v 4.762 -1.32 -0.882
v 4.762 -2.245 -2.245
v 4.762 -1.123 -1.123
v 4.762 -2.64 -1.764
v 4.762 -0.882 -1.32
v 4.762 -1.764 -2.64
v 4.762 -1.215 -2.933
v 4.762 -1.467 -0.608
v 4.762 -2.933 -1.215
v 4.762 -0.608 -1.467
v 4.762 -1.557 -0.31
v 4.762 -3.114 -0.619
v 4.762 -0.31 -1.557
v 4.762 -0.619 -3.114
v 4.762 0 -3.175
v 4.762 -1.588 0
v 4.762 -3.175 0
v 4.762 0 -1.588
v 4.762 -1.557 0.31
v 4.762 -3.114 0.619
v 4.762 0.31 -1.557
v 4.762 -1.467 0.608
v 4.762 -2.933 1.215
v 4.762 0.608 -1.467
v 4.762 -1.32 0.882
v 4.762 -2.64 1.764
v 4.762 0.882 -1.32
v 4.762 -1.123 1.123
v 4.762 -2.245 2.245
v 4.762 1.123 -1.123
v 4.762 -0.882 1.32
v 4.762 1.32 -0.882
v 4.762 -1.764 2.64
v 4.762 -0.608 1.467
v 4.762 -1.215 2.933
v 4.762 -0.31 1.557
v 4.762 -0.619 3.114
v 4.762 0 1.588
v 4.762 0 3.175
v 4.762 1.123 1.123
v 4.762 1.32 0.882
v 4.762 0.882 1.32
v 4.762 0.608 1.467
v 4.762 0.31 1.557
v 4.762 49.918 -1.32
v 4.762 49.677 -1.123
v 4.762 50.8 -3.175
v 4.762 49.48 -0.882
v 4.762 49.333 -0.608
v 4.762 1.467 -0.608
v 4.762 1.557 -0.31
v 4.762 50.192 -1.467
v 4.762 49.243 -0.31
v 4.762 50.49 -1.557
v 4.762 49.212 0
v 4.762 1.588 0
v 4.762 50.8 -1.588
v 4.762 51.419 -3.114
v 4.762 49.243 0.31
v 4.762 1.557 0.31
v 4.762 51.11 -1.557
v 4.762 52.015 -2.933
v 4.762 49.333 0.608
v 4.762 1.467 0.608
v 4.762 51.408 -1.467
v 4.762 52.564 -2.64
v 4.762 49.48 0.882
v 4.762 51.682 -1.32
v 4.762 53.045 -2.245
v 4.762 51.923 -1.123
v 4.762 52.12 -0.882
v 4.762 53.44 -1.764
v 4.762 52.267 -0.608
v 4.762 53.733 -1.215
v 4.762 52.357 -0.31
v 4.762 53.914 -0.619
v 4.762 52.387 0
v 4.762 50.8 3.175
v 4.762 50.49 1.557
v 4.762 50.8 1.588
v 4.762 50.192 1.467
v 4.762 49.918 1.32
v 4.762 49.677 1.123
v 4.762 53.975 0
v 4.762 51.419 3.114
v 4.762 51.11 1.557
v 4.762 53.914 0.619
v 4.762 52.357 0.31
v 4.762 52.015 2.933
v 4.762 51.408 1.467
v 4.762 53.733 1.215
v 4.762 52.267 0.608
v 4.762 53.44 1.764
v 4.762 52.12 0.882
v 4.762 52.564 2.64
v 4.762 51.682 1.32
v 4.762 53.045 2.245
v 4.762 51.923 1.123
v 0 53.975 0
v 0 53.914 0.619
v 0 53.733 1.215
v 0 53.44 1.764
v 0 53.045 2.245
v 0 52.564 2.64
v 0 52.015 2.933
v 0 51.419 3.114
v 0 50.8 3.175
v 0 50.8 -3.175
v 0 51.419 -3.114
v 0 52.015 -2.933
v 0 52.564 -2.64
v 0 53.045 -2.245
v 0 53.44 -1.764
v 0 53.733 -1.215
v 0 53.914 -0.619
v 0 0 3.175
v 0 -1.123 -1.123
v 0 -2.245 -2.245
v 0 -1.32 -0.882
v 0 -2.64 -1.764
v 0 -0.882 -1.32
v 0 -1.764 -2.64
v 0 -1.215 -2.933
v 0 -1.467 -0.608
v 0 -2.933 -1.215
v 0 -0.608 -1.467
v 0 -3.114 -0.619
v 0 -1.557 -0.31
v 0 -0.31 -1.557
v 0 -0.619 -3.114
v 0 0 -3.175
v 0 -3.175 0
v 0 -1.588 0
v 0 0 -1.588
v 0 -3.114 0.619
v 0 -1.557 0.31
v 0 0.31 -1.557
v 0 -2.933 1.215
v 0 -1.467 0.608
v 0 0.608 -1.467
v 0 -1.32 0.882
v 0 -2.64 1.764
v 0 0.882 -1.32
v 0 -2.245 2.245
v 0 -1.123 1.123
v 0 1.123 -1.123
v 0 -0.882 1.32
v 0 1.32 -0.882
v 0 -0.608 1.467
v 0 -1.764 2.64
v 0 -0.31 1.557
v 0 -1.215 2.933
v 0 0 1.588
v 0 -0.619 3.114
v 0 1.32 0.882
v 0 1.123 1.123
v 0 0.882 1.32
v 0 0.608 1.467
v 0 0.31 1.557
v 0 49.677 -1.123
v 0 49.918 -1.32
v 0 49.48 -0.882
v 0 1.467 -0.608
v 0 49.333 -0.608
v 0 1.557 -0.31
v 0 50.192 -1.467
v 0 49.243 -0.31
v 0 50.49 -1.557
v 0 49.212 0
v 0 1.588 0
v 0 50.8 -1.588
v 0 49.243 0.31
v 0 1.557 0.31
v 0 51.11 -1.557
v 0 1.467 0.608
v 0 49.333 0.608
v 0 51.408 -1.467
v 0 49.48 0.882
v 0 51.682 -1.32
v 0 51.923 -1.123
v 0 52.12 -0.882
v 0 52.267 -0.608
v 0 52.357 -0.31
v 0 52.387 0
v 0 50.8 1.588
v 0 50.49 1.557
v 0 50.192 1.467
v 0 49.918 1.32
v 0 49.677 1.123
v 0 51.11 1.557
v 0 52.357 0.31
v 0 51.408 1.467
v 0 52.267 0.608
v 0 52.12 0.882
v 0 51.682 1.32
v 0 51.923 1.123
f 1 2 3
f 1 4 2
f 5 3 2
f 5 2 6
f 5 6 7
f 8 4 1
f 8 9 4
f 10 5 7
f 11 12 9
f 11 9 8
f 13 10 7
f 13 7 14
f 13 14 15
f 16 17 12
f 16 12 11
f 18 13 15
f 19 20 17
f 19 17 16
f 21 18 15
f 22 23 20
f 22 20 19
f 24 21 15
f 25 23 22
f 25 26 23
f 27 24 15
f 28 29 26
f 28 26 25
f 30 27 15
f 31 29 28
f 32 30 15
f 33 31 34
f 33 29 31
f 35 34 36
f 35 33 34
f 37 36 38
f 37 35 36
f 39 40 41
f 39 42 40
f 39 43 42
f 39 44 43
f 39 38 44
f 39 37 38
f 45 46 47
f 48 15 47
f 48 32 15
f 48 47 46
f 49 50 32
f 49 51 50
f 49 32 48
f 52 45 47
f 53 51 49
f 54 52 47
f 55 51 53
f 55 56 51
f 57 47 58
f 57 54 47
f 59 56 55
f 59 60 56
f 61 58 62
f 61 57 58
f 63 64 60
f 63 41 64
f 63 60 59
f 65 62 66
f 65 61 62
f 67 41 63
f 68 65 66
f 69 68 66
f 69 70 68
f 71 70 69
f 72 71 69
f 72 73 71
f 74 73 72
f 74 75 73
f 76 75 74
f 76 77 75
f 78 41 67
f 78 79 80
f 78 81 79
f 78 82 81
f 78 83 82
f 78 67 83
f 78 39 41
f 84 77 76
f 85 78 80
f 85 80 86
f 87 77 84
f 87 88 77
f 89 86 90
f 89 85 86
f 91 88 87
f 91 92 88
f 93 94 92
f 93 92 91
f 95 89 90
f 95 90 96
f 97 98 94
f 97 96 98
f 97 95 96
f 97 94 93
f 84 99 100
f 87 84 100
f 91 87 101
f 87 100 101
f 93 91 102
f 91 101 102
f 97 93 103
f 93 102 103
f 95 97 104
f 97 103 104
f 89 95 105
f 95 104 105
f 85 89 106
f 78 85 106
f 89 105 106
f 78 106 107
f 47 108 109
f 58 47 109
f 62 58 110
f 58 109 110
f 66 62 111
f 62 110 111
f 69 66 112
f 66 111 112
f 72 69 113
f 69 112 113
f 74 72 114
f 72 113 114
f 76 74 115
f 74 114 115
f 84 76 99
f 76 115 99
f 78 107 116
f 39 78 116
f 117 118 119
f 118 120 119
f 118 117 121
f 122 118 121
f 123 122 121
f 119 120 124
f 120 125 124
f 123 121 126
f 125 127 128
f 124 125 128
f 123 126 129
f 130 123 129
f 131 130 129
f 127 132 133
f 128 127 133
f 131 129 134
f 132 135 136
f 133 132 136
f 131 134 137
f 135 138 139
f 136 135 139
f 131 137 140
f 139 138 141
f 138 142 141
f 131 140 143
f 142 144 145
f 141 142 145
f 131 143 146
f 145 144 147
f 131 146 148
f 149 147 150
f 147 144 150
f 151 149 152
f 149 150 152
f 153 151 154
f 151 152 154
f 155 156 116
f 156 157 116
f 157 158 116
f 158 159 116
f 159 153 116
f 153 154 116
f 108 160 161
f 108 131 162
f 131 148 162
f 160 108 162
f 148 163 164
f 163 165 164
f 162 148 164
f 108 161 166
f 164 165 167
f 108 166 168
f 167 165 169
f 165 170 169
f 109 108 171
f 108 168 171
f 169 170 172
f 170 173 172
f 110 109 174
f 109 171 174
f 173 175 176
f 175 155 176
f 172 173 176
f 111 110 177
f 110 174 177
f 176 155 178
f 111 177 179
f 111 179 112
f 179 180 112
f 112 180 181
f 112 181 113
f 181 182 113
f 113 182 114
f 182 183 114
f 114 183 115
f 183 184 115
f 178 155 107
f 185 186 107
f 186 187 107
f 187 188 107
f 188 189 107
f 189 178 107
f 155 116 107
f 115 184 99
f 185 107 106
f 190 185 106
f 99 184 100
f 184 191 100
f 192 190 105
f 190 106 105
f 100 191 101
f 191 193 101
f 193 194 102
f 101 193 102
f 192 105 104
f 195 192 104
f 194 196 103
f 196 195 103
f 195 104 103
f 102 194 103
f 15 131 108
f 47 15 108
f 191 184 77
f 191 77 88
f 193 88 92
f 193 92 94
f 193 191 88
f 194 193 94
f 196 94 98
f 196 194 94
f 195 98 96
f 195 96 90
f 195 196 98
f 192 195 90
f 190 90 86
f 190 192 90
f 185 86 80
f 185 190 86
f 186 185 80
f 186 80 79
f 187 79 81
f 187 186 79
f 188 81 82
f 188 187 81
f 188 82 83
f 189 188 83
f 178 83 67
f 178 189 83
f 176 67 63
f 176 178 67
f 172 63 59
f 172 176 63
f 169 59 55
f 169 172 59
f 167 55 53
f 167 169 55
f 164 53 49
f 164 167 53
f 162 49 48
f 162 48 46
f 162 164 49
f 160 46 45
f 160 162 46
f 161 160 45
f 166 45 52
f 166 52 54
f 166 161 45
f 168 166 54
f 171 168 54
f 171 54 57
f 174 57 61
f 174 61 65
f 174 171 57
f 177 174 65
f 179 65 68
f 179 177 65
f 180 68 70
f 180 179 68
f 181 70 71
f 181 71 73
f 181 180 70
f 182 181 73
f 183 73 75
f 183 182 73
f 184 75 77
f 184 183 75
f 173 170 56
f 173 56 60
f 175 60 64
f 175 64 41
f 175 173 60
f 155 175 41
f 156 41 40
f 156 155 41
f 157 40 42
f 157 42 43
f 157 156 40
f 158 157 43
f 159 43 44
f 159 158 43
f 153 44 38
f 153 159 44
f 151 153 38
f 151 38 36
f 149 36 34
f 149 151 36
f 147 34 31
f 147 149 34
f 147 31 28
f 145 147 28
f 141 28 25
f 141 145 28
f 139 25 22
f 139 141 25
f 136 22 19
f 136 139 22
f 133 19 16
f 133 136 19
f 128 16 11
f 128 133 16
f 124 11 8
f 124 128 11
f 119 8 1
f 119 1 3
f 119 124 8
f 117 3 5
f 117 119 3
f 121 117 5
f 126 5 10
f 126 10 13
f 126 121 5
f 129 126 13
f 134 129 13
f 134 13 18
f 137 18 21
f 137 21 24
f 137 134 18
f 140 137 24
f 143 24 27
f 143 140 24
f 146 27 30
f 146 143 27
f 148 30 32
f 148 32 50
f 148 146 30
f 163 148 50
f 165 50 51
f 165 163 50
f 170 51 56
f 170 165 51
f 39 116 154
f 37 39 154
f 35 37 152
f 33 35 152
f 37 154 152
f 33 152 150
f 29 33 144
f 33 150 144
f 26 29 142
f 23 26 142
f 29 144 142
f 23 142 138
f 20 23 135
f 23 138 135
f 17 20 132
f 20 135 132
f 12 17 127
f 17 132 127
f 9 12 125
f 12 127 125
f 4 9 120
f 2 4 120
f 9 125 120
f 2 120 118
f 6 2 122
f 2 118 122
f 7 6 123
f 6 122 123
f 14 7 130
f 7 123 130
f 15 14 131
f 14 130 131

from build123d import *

# Parameters (mm, degrees)
F0_R     = 1.5875
F1_DEPTH = 4.7625


with BuildPart() as f1:
    # F0 (on Right) → F1 (new body)
    with BuildSketch(Plane.YZ):
        with BuildLine():
            ThreePointArc((0, 3.175), (2.245064, 2.245064), (3.175, 0))
            ThreePointArc((3.175, 0), (2.245064, -2.245064), (0, -3.175))
            Line((0, -3.175), (50.8, -3.175))
            ThreePointArc((50.8, -3.175), (47.625, 0), (50.8, 3.175))
            Line((50.8, 3.175), (0, 3.175))
        make_face()
        with BuildLine():
            ThreePointArc((0, -3.175), (2.245064, -2.245064), (3.175, 0))
            ThreePointArc((3.175, 0), (2.245064, 2.245064), (0, 3.175))
            ThreePointArc((0, 3.175), (-3.175, 0), (0, -3.175))
        make_face()
        Circle(F0_R, mode=Mode.SUBTRACT)
        with BuildLine():
            ThreePointArc((53.975, 0), (53.045064, 2.245064), (50.8, 3.175))
            ThreePointArc((50.8, 3.175), (47.625, 0), (50.8, -3.175))
            ThreePointArc((50.8, -3.175), (53.045064, -2.245064), (53.975, 0))
        make_face()
        with Locations((50.8, 0)):
            Circle(F0_R, mode=Mode.SUBTRACT)
    extrude(amount=F1_DEPTH)


solid = f1.part
